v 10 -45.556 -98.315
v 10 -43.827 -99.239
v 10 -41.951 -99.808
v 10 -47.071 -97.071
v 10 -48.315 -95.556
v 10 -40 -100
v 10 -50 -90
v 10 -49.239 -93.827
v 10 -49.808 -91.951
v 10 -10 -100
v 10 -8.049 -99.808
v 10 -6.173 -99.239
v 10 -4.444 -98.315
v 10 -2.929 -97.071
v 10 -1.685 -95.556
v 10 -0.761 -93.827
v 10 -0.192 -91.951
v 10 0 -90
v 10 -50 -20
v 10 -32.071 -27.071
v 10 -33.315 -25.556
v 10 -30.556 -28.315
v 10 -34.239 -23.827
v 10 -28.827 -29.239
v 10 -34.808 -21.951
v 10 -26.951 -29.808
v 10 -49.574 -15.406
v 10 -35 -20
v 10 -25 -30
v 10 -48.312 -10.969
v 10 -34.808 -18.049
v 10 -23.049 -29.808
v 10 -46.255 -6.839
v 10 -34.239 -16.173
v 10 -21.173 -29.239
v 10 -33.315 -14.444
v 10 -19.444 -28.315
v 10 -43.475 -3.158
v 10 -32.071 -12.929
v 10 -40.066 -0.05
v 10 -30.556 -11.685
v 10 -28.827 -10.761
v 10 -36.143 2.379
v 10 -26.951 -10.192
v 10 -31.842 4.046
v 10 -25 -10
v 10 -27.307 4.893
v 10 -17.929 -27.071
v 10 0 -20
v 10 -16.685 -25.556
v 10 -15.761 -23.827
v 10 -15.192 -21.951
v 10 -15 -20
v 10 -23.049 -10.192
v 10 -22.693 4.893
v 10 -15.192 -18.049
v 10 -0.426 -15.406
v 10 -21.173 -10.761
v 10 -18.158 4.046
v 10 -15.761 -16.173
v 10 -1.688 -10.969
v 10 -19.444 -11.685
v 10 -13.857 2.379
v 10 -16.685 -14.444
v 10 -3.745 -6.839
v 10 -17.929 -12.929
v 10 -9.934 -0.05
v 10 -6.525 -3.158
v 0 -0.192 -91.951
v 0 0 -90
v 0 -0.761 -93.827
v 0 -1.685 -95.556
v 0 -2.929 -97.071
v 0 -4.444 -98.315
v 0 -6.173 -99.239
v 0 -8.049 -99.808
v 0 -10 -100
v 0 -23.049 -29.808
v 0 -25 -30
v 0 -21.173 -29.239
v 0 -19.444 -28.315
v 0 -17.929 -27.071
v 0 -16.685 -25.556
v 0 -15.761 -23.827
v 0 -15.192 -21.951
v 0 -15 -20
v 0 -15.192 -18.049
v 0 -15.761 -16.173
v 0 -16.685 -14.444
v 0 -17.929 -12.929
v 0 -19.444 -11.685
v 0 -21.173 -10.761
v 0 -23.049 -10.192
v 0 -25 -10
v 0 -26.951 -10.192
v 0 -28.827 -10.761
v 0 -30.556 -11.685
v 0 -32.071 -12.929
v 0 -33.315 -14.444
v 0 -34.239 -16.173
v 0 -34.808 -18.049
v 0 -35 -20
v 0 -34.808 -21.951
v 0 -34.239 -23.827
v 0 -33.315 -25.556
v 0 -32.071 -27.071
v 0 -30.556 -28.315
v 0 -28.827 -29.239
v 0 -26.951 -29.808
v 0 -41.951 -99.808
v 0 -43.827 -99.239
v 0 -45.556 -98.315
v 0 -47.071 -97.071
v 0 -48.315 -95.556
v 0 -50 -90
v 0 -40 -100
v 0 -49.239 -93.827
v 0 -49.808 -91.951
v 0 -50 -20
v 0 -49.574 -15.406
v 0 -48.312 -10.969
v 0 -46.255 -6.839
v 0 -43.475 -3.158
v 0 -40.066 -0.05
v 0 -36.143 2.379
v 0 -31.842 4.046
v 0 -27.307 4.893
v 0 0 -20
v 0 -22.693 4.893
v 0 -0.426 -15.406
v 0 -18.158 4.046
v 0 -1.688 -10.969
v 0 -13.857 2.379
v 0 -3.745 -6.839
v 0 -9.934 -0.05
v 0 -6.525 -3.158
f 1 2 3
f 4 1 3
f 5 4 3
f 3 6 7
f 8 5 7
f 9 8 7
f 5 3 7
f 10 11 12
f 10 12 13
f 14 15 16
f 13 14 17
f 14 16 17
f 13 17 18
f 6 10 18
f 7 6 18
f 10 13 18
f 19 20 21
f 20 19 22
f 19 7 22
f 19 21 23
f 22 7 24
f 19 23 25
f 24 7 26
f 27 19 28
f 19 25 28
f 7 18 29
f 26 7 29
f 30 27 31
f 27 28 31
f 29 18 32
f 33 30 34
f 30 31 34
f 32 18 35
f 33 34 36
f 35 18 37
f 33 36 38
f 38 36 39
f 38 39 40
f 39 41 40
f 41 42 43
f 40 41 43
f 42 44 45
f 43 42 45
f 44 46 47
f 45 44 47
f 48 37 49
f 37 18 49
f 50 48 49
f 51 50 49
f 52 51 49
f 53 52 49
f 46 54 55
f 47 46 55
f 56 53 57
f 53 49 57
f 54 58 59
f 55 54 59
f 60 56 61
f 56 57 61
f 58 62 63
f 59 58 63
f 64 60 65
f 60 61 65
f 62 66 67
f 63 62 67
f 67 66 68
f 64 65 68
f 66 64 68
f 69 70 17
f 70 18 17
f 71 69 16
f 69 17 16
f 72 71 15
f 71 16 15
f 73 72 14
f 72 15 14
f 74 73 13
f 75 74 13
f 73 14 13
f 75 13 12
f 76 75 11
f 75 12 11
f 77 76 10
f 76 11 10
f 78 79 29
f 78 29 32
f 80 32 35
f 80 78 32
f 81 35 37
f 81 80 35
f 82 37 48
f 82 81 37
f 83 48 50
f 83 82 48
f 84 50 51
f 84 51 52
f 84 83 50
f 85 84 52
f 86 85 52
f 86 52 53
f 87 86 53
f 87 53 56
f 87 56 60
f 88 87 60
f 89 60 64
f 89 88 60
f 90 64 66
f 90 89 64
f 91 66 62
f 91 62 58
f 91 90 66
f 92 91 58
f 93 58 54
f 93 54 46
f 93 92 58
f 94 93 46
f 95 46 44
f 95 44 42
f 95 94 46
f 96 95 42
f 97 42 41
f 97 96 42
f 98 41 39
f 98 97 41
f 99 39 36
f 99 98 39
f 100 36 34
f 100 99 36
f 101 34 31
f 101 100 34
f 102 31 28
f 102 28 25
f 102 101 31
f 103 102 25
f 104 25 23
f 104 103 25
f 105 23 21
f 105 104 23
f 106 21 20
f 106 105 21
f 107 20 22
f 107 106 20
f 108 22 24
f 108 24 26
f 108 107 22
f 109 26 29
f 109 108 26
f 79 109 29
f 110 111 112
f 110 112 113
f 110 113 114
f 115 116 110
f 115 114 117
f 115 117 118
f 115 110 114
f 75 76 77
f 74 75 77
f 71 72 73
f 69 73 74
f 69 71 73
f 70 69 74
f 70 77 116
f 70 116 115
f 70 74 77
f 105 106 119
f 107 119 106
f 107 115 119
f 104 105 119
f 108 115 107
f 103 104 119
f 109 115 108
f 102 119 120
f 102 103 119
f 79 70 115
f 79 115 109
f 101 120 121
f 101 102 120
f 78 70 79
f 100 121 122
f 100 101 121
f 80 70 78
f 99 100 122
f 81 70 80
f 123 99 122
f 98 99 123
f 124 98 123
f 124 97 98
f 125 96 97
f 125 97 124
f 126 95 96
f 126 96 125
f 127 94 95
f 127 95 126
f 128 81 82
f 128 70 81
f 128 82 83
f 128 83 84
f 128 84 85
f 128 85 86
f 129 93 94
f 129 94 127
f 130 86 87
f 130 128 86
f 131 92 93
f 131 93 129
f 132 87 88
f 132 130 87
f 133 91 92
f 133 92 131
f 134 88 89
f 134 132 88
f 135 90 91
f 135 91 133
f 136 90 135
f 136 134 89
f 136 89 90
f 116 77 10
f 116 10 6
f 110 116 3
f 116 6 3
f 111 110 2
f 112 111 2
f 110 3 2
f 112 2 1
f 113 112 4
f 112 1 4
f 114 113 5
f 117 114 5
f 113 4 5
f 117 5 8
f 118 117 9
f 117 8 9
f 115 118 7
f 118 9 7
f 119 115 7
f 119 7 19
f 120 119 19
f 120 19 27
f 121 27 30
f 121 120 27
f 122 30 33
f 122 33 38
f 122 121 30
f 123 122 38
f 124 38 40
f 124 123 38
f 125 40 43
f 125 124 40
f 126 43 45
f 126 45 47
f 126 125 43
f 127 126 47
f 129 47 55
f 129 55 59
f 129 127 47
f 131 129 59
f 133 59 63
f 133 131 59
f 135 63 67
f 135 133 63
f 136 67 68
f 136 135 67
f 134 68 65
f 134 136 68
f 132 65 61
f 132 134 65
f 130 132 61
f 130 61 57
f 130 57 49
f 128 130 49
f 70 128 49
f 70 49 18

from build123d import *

# Parameters (mm, degrees)
SKETCH1_R           = 10
BOSS_EXTRUDE1_DEPTH = 10
FILLET1_R           = 10


with BuildPart() as part:
    # Sketch1 → Boss-Extrude1 (new body)
    with BuildSketch(Plane(origin=(0, 0, 0), x_dir=(0, 0, -1), z_dir=(1, 0, 0))):
        with BuildLine():
            Line((20, 0), (100, 0))
            Line((100, 0), (100, -50))
            Line((100, -50), (20, -50))
            ThreePointArc((20, -50), (-5, -25), (20, 0))
        make_face()
        with Locations((20, -25)):
            Circle(SKETCH1_R, mode=Mode.SUBTRACT)
    extrude(amount=BOSS_EXTRUDE1_DEPTH)

    # Fillet1
    fillet1_edges = [part.edges().sort_by_distance(p)[0] for p in [
        (5, -50, -100),
        (5, 0, -100),
    ]]
    fillet(fillet1_edges, radius=FILLET1_R)


solid = part.part
